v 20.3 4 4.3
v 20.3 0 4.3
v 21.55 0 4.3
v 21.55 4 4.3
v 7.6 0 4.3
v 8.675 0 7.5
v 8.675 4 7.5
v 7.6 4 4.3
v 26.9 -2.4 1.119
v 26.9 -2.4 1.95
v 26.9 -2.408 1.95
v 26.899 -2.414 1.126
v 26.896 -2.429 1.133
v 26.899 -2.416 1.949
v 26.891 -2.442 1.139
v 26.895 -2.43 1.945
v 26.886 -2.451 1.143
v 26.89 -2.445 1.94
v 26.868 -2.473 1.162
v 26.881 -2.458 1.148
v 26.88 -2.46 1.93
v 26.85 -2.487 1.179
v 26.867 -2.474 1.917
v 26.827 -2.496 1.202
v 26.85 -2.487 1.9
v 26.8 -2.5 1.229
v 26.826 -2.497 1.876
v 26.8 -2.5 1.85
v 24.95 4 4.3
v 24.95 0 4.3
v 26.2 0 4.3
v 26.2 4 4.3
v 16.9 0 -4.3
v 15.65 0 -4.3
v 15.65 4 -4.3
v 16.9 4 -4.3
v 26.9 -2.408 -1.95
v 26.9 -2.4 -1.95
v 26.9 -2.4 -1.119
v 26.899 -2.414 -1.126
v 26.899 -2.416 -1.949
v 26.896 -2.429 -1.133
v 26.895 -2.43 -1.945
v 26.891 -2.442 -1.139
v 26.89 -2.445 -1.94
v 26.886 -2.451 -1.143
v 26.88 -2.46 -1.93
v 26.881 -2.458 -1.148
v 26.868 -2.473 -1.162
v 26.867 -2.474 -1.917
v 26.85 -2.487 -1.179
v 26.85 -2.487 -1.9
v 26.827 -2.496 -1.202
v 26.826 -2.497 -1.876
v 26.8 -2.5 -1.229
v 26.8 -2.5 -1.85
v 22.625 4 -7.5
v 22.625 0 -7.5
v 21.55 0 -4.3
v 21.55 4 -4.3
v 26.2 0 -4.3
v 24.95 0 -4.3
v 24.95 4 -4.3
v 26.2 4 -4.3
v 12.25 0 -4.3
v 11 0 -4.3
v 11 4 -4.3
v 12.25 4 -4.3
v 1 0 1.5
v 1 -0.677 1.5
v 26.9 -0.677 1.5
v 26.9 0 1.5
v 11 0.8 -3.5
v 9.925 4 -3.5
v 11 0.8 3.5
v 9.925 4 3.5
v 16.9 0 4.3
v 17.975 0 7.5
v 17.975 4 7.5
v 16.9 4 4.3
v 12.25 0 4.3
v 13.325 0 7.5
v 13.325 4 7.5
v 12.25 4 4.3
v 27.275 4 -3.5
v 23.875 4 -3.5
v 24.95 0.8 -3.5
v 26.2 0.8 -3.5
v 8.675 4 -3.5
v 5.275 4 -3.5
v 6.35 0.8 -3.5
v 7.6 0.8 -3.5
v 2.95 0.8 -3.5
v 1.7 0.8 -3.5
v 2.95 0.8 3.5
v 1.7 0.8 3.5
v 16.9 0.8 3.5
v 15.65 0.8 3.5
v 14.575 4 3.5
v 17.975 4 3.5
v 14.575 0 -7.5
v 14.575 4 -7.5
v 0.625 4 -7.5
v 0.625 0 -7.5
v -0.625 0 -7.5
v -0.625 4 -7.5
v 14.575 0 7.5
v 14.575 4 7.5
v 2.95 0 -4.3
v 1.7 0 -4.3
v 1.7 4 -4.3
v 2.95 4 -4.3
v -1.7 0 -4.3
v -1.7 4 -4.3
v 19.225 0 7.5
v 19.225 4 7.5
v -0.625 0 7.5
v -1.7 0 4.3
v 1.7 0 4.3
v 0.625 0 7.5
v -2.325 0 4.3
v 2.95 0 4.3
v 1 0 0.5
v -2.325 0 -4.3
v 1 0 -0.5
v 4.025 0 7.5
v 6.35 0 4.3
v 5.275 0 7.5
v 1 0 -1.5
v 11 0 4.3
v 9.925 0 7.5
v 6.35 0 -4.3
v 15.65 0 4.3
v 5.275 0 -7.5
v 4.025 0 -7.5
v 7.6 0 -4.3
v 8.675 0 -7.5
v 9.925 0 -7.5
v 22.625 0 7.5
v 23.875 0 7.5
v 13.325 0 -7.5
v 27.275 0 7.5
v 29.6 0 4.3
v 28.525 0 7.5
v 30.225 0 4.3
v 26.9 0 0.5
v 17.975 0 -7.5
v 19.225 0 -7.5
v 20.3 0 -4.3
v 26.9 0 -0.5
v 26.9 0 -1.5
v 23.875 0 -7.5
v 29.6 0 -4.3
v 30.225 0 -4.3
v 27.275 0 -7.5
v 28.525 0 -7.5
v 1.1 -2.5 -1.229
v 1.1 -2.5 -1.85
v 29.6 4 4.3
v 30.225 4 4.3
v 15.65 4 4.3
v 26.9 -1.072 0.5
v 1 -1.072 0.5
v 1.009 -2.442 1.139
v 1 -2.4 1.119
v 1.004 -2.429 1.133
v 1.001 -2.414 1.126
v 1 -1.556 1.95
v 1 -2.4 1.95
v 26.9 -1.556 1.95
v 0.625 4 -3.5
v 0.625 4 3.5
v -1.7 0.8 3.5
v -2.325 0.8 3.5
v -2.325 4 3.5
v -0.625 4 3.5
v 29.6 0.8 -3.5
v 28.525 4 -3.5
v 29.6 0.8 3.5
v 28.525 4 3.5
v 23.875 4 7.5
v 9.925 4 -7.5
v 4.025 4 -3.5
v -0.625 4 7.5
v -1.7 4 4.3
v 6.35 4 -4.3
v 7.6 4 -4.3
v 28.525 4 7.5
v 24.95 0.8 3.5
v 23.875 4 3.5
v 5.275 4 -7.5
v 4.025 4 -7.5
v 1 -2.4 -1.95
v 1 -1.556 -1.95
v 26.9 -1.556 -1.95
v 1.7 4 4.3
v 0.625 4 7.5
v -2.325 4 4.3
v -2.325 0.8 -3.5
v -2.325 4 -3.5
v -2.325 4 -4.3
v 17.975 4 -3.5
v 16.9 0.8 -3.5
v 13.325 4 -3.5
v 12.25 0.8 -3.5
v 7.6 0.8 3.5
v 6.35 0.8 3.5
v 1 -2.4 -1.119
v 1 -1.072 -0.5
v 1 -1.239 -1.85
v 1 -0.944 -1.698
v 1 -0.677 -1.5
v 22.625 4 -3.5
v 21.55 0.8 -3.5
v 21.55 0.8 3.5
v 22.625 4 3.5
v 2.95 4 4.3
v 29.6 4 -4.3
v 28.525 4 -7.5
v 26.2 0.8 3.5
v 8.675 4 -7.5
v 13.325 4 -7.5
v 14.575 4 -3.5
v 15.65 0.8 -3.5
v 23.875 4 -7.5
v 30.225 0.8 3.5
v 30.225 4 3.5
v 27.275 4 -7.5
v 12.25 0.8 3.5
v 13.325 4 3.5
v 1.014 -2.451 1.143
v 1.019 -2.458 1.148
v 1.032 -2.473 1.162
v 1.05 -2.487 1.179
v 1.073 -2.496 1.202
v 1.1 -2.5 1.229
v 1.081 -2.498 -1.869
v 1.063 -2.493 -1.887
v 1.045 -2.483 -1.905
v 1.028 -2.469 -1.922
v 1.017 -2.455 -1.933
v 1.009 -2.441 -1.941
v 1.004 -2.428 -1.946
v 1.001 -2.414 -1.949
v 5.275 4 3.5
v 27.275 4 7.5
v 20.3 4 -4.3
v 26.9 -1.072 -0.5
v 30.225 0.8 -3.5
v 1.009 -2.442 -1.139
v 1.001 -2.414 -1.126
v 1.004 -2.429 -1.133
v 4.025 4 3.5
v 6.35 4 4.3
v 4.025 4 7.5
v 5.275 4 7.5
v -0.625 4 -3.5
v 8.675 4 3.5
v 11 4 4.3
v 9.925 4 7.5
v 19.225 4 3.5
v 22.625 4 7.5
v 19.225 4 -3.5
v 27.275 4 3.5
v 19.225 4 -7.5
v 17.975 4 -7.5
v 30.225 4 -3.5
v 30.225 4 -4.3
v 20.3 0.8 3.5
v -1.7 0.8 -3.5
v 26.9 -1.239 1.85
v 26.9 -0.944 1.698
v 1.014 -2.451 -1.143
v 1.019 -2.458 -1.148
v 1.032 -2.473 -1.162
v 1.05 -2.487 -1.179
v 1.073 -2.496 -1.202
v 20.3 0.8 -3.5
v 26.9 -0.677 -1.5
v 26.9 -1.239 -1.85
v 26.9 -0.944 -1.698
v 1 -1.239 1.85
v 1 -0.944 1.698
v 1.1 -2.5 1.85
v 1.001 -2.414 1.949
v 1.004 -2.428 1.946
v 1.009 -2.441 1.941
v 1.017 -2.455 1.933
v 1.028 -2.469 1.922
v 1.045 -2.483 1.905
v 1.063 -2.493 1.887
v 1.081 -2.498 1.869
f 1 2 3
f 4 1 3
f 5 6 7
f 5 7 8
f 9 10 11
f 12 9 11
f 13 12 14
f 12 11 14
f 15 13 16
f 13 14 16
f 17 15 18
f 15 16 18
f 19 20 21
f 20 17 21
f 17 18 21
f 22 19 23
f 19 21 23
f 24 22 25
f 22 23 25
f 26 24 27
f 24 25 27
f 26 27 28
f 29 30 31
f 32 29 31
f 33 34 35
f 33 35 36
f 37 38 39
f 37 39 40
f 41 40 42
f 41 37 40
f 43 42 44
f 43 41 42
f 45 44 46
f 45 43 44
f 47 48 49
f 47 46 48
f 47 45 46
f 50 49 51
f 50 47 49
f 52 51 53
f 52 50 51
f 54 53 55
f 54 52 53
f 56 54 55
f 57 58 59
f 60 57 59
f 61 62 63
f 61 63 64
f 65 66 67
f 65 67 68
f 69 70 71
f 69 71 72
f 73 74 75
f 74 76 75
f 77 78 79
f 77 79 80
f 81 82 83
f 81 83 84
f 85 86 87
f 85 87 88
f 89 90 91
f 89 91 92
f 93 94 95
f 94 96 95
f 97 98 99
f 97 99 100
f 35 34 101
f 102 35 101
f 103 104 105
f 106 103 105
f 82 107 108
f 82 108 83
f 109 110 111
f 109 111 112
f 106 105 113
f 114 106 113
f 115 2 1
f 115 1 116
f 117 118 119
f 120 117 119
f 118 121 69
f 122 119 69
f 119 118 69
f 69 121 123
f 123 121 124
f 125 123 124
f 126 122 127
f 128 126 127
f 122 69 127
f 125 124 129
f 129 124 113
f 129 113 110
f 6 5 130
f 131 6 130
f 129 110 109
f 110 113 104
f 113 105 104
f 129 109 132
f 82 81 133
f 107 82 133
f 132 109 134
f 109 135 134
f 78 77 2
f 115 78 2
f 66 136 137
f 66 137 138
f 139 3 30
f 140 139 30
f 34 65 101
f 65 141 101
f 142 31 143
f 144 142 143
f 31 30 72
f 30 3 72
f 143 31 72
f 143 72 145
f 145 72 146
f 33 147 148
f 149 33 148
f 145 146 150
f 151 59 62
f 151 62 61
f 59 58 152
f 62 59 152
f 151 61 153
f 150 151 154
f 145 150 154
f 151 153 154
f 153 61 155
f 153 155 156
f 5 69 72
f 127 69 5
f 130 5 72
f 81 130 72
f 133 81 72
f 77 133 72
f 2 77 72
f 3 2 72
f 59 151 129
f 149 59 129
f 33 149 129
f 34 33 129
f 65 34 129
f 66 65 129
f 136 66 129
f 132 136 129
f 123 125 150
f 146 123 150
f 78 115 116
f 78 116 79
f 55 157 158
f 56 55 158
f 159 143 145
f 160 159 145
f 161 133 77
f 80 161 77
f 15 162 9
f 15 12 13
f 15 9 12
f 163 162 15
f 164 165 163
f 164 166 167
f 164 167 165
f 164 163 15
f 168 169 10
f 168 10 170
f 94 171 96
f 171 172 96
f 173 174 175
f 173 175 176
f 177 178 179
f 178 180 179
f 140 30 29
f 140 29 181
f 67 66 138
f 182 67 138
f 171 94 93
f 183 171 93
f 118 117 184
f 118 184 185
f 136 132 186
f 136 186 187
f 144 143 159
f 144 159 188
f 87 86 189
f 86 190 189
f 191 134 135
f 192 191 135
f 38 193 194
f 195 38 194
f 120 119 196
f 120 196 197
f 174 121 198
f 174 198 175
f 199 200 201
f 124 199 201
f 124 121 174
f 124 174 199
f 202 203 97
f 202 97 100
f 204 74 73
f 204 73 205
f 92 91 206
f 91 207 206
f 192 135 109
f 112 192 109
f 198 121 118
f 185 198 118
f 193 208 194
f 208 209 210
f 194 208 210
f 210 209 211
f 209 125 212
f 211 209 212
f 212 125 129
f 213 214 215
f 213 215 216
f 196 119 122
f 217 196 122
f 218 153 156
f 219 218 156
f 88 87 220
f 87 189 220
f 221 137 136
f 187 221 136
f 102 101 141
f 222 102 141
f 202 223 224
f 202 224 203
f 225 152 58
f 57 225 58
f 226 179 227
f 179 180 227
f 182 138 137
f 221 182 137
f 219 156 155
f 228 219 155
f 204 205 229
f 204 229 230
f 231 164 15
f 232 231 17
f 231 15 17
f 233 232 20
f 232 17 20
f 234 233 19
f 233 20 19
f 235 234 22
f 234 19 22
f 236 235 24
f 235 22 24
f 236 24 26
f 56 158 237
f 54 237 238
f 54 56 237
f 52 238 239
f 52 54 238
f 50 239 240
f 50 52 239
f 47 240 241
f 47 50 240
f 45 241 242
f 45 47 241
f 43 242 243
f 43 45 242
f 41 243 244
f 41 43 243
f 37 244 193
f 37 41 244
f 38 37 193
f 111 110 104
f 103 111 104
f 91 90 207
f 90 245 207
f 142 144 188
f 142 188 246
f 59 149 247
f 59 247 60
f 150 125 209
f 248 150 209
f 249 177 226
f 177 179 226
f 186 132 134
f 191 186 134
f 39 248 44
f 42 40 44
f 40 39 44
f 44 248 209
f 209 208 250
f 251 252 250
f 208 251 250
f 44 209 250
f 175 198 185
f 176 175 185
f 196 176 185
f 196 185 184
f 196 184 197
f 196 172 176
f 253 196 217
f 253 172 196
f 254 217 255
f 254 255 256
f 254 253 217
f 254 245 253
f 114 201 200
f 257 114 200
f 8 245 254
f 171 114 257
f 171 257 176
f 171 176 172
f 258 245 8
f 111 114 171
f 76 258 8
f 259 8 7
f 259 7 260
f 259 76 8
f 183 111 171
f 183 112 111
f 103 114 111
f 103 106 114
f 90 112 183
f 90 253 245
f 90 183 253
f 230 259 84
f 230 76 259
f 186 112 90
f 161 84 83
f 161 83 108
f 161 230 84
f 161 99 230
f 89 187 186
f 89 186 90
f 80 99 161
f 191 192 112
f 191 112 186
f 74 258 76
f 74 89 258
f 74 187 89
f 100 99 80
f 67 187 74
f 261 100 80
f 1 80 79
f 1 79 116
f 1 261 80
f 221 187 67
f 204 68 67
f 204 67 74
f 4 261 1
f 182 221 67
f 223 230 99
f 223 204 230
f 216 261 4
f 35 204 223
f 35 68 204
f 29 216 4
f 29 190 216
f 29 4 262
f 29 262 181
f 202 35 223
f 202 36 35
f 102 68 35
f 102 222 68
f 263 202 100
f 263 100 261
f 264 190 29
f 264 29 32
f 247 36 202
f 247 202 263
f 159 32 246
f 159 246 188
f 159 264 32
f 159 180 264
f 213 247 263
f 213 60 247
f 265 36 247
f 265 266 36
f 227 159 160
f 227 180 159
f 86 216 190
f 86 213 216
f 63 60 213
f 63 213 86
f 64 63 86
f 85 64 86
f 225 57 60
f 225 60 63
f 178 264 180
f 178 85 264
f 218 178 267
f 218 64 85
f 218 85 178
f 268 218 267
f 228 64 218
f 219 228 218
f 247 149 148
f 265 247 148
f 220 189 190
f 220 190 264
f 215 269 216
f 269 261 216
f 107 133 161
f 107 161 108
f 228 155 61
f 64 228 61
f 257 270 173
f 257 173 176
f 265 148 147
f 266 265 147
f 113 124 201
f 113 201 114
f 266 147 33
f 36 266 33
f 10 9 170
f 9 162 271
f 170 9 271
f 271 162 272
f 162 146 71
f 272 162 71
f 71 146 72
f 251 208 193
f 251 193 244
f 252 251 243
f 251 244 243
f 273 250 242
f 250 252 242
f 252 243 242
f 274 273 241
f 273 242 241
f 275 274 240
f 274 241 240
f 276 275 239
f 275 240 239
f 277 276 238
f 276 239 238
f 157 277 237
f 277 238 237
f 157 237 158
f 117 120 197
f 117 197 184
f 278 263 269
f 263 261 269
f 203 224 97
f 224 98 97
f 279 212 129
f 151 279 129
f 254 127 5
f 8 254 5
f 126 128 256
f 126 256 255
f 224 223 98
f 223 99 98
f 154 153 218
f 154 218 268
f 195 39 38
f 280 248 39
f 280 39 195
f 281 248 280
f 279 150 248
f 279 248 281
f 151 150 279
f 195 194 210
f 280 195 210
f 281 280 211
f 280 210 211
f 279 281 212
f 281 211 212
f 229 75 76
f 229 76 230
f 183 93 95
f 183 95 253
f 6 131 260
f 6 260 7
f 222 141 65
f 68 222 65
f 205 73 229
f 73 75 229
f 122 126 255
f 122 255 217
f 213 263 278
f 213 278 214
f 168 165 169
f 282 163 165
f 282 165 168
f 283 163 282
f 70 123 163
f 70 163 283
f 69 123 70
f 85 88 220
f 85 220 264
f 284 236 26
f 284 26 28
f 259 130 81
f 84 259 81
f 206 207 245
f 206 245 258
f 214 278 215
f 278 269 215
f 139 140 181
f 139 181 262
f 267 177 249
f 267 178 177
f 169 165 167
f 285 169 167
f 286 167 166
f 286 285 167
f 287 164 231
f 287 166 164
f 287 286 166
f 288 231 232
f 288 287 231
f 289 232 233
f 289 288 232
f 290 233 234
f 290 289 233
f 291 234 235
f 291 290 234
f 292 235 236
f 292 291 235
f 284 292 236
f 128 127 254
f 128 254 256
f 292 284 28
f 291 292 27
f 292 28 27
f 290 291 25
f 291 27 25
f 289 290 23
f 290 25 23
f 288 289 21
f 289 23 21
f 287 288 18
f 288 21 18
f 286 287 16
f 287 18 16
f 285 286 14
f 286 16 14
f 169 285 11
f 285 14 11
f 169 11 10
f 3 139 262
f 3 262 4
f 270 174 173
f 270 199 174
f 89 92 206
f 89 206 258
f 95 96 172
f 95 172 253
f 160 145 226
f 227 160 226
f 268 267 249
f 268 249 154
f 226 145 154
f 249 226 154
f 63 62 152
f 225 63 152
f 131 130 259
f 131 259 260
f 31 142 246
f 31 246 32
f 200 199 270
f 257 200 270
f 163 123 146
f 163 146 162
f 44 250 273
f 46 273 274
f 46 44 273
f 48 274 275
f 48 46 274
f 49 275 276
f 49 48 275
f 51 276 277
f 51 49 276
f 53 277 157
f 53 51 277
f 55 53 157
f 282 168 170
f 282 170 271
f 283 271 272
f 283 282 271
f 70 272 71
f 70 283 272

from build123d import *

# Parameters (mm, degrees)
SKETCH_1_W                    = 4.65
SKETCH_1_H                    = 8.6
EXTRUDE_1_DEPTH               = 4
EXTRUDE_2_DEPTH               = 4
CUT_EXTRUDE_1_DEPTH           = 3.5
PATTERN_LINEAR_4_COUNT        = 7
PATTERN_LINEAR_4_PITCH        = 4.65
PATTERN_LINEAR_4_COPY_1_DEPTH = 4
PATTERN_LINEAR_4_COPY_2_DEPTH = 4
PATTERN_LINEAR_4_COPY_3_DEPTH = 4
PATTERN_LINEAR_4_COPY_4_DEPTH = 4
PATTERN_LINEAR_4_COPY_5_DEPTH = 4
PATTERN_LINEAR_4_COPY_6_DEPTH = 4
EXTRUDE_START                 = 1
EXTRUDE_4_DEPTH               = 25.9
FILLET_1_R                    = 0.1


with BuildPart() as part:
    # 草图1 → 凸台-拉伸1 (new body)
    with BuildSketch(Plane(origin=(0, 0, 0), x_dir=(1, 0, 0), z_dir=(0, 1, 0))):
        Rectangle(SKETCH_1_W, SKETCH_1_H)
    extrude_1 = extrude(amount=EXTRUDE_1_DEPTH)

    # 草图3 → 凸台-拉伸2 (add)
    with BuildSketch(Plane(origin=(0, 0, 0), x_dir=(1, 0, 0), z_dir=(0, 1, 0))):
        Polygon((0.625, 7.5), (-0.625, 7.5), (-1.7, 4.3), (1.7, 4.3), align=None)
    extrude_2 = extrude(amount=EXTRUDE_2_DEPTH)

    # 镜向1: 凸台-拉伸2 across plane
    add(extrude_2.mirror(Plane.XY))

    # 草图4 → 切除-拉伸1 (cut, symmetric)
    with BuildSketch(Plane.XY):
        Polygon((-0.625, 4), (-2.325, 4), (-2.325, 0.8), (-1.7, 0.8), align=None)
        Polygon((1.7, 0.8), (2.325, 0.8), (2.325, 4), (0.625, 4), align=None)
    cut_extrude_1 = extrude(amount=CUT_EXTRUDE_1_DEPTH, both=True, mode=Mode.SUBTRACT)

    # 阵列(线性)4: 凸台-拉伸1, 凸台-拉伸2, 切除-拉伸1 ×7
    with Locations(*[(i * PATTERN_LINEAR_4_PITCH, 0, 0) for i in range(1, PATTERN_LINEAR_4_COUNT)]):
        add(extrude_1)
        add(extrude_2)
        add(cut_extrude_1, mode=Mode.SUBTRACT)

    # 阵列(线性)4 copy 1 sketch → 阵列(线性)4 copy 1 (add)
    with BuildSketch(Plane(origin=(4.65, 0, 0), x_dir=(1, 0, 0), z_dir=(0, 1, 0))):
        Polygon((0.625, -7.5), (-0.625, -7.5), (-1.7, -4.3), (1.7, -4.3), align=None)
    extrude(amount=PATTERN_LINEAR_4_COPY_1_DEPTH)

    # 阵列(线性)4 copy 2 sketch → 阵列(线性)4 copy 2 (add)
    with BuildSketch(Plane(origin=(9.3, 0, 0), x_dir=(1, 0, 0), z_dir=(0, 1, 0))):
        Polygon((0.625, -7.5), (-0.625, -7.5), (-1.7, -4.3), (1.7, -4.3), align=None)
    extrude(amount=PATTERN_LINEAR_4_COPY_2_DEPTH)

    # 阵列(线性)4 copy 3 sketch → 阵列(线性)4 copy 3 (add)
    with BuildSketch(Plane(origin=(13.95, 0, 0), x_dir=(1, 0, 0), z_dir=(0, 1, 0))):
        Polygon((0.625, -7.5), (-0.625, -7.5), (-1.7, -4.3), (1.7, -4.3), align=None)
    extrude(amount=PATTERN_LINEAR_4_COPY_3_DEPTH)

    # 阵列(线性)4 copy 4 sketch → 阵列(线性)4 copy 4 (add)
    with BuildSketch(Plane(origin=(18.6, 0, 0), x_dir=(1, 0, 0), z_dir=(0, 1, 0))):
        Polygon((0.625, -7.5), (-0.625, -7.5), (-1.7, -4.3), (1.7, -4.3), align=None)
    extrude(amount=PATTERN_LINEAR_4_COPY_4_DEPTH)

    # 阵列(线性)4 copy 5 sketch → 阵列(线性)4 copy 5 (add)
    with BuildSketch(Plane(origin=(23.25, 0, 0), x_dir=(1, 0, 0), z_dir=(0, 1, 0))):
        Polygon((0.625, -7.5), (-0.625, -7.5), (-1.7, -4.3), (1.7, -4.3), align=None)
    extrude(amount=PATTERN_LINEAR_4_COPY_5_DEPTH)

    # 阵列(线性)4 copy 6 sketch → 阵列(线性)4 copy 6 (add)
    with BuildSketch(Plane(origin=(27.9, 0, 0), x_dir=(1, 0, 0), z_dir=(0, 1, 0))):
        Polygon((0.625, -7.5), (-0.625, -7.5), (-1.7, -4.3), (1.7, -4.3), align=None)
    extrude(amount=PATTERN_LINEAR_4_COPY_6_DEPTH)

    # 草图6 → 凸台-拉伸4 (add)
    with BuildSketch(Plane(origin=(0, 0, 0), x_dir=(0, 0, -1), z_dir=(1, 0, 0)).offset(EXTRUDE_START)):
        with BuildLine():
            Line((1.5, 0), (0.5, 0))
            Line((0.5, 0), (0.5, -1.07225346))
            Line((0.5, -1.07225346), (1.165769145, -2.5))
            Line((1.165769145, -2.5), (1.95, -2.5))
            Line((1.95, -2.5), (1.95, -1.555590279))
            ThreePointArc((1.95, -1.555590279), (1.780042303, -1.088161527), (1.5, -0.677124344))
            Line((1.5, -0.677124344), (1.5, 0))
        make_face()
        with BuildLine():
            Line((-0.5, -1.07225346), (-1.165769145, -2.5))
            Line((-1.165769145, -2.5), (-1.95, -2.5))
            Line((-1.95, -2.5), (-1.95, -1.555590279))
            ThreePointArc((-1.95, -1.555590279), (-1.780042303, -1.088161527), (-1.5, -0.677124344))
            Line((-1.5, -0.677124344), (-1.5, 0))
            Line((-1.5, 0), (-0.5, 0))
            Line((-0.5, 0), (-0.5, -1.07225346))
        make_face()
    extrude(amount=EXTRUDE_4_DEPTH)

    # 圆角1
    fillet_1_edges = [part.edges().sort_by_distance(p)[0] for p in [
        (1, -2.5, -1.557884573),
        (13.95, -2.5, -1.165769145),
        (13.95, -2.5, -1.95),
        (26.9, -2.5, -1.557884573),
        (1, -2.5, 1.557884573),
        (13.95, -2.5, 1.95),
        (13.95, -2.5, 1.165769145),
        (26.9, -2.5, 1.557884573),
    ]]
    fillet(fillet_1_edges, radius=FILLET_1_R)


solid = part.part
